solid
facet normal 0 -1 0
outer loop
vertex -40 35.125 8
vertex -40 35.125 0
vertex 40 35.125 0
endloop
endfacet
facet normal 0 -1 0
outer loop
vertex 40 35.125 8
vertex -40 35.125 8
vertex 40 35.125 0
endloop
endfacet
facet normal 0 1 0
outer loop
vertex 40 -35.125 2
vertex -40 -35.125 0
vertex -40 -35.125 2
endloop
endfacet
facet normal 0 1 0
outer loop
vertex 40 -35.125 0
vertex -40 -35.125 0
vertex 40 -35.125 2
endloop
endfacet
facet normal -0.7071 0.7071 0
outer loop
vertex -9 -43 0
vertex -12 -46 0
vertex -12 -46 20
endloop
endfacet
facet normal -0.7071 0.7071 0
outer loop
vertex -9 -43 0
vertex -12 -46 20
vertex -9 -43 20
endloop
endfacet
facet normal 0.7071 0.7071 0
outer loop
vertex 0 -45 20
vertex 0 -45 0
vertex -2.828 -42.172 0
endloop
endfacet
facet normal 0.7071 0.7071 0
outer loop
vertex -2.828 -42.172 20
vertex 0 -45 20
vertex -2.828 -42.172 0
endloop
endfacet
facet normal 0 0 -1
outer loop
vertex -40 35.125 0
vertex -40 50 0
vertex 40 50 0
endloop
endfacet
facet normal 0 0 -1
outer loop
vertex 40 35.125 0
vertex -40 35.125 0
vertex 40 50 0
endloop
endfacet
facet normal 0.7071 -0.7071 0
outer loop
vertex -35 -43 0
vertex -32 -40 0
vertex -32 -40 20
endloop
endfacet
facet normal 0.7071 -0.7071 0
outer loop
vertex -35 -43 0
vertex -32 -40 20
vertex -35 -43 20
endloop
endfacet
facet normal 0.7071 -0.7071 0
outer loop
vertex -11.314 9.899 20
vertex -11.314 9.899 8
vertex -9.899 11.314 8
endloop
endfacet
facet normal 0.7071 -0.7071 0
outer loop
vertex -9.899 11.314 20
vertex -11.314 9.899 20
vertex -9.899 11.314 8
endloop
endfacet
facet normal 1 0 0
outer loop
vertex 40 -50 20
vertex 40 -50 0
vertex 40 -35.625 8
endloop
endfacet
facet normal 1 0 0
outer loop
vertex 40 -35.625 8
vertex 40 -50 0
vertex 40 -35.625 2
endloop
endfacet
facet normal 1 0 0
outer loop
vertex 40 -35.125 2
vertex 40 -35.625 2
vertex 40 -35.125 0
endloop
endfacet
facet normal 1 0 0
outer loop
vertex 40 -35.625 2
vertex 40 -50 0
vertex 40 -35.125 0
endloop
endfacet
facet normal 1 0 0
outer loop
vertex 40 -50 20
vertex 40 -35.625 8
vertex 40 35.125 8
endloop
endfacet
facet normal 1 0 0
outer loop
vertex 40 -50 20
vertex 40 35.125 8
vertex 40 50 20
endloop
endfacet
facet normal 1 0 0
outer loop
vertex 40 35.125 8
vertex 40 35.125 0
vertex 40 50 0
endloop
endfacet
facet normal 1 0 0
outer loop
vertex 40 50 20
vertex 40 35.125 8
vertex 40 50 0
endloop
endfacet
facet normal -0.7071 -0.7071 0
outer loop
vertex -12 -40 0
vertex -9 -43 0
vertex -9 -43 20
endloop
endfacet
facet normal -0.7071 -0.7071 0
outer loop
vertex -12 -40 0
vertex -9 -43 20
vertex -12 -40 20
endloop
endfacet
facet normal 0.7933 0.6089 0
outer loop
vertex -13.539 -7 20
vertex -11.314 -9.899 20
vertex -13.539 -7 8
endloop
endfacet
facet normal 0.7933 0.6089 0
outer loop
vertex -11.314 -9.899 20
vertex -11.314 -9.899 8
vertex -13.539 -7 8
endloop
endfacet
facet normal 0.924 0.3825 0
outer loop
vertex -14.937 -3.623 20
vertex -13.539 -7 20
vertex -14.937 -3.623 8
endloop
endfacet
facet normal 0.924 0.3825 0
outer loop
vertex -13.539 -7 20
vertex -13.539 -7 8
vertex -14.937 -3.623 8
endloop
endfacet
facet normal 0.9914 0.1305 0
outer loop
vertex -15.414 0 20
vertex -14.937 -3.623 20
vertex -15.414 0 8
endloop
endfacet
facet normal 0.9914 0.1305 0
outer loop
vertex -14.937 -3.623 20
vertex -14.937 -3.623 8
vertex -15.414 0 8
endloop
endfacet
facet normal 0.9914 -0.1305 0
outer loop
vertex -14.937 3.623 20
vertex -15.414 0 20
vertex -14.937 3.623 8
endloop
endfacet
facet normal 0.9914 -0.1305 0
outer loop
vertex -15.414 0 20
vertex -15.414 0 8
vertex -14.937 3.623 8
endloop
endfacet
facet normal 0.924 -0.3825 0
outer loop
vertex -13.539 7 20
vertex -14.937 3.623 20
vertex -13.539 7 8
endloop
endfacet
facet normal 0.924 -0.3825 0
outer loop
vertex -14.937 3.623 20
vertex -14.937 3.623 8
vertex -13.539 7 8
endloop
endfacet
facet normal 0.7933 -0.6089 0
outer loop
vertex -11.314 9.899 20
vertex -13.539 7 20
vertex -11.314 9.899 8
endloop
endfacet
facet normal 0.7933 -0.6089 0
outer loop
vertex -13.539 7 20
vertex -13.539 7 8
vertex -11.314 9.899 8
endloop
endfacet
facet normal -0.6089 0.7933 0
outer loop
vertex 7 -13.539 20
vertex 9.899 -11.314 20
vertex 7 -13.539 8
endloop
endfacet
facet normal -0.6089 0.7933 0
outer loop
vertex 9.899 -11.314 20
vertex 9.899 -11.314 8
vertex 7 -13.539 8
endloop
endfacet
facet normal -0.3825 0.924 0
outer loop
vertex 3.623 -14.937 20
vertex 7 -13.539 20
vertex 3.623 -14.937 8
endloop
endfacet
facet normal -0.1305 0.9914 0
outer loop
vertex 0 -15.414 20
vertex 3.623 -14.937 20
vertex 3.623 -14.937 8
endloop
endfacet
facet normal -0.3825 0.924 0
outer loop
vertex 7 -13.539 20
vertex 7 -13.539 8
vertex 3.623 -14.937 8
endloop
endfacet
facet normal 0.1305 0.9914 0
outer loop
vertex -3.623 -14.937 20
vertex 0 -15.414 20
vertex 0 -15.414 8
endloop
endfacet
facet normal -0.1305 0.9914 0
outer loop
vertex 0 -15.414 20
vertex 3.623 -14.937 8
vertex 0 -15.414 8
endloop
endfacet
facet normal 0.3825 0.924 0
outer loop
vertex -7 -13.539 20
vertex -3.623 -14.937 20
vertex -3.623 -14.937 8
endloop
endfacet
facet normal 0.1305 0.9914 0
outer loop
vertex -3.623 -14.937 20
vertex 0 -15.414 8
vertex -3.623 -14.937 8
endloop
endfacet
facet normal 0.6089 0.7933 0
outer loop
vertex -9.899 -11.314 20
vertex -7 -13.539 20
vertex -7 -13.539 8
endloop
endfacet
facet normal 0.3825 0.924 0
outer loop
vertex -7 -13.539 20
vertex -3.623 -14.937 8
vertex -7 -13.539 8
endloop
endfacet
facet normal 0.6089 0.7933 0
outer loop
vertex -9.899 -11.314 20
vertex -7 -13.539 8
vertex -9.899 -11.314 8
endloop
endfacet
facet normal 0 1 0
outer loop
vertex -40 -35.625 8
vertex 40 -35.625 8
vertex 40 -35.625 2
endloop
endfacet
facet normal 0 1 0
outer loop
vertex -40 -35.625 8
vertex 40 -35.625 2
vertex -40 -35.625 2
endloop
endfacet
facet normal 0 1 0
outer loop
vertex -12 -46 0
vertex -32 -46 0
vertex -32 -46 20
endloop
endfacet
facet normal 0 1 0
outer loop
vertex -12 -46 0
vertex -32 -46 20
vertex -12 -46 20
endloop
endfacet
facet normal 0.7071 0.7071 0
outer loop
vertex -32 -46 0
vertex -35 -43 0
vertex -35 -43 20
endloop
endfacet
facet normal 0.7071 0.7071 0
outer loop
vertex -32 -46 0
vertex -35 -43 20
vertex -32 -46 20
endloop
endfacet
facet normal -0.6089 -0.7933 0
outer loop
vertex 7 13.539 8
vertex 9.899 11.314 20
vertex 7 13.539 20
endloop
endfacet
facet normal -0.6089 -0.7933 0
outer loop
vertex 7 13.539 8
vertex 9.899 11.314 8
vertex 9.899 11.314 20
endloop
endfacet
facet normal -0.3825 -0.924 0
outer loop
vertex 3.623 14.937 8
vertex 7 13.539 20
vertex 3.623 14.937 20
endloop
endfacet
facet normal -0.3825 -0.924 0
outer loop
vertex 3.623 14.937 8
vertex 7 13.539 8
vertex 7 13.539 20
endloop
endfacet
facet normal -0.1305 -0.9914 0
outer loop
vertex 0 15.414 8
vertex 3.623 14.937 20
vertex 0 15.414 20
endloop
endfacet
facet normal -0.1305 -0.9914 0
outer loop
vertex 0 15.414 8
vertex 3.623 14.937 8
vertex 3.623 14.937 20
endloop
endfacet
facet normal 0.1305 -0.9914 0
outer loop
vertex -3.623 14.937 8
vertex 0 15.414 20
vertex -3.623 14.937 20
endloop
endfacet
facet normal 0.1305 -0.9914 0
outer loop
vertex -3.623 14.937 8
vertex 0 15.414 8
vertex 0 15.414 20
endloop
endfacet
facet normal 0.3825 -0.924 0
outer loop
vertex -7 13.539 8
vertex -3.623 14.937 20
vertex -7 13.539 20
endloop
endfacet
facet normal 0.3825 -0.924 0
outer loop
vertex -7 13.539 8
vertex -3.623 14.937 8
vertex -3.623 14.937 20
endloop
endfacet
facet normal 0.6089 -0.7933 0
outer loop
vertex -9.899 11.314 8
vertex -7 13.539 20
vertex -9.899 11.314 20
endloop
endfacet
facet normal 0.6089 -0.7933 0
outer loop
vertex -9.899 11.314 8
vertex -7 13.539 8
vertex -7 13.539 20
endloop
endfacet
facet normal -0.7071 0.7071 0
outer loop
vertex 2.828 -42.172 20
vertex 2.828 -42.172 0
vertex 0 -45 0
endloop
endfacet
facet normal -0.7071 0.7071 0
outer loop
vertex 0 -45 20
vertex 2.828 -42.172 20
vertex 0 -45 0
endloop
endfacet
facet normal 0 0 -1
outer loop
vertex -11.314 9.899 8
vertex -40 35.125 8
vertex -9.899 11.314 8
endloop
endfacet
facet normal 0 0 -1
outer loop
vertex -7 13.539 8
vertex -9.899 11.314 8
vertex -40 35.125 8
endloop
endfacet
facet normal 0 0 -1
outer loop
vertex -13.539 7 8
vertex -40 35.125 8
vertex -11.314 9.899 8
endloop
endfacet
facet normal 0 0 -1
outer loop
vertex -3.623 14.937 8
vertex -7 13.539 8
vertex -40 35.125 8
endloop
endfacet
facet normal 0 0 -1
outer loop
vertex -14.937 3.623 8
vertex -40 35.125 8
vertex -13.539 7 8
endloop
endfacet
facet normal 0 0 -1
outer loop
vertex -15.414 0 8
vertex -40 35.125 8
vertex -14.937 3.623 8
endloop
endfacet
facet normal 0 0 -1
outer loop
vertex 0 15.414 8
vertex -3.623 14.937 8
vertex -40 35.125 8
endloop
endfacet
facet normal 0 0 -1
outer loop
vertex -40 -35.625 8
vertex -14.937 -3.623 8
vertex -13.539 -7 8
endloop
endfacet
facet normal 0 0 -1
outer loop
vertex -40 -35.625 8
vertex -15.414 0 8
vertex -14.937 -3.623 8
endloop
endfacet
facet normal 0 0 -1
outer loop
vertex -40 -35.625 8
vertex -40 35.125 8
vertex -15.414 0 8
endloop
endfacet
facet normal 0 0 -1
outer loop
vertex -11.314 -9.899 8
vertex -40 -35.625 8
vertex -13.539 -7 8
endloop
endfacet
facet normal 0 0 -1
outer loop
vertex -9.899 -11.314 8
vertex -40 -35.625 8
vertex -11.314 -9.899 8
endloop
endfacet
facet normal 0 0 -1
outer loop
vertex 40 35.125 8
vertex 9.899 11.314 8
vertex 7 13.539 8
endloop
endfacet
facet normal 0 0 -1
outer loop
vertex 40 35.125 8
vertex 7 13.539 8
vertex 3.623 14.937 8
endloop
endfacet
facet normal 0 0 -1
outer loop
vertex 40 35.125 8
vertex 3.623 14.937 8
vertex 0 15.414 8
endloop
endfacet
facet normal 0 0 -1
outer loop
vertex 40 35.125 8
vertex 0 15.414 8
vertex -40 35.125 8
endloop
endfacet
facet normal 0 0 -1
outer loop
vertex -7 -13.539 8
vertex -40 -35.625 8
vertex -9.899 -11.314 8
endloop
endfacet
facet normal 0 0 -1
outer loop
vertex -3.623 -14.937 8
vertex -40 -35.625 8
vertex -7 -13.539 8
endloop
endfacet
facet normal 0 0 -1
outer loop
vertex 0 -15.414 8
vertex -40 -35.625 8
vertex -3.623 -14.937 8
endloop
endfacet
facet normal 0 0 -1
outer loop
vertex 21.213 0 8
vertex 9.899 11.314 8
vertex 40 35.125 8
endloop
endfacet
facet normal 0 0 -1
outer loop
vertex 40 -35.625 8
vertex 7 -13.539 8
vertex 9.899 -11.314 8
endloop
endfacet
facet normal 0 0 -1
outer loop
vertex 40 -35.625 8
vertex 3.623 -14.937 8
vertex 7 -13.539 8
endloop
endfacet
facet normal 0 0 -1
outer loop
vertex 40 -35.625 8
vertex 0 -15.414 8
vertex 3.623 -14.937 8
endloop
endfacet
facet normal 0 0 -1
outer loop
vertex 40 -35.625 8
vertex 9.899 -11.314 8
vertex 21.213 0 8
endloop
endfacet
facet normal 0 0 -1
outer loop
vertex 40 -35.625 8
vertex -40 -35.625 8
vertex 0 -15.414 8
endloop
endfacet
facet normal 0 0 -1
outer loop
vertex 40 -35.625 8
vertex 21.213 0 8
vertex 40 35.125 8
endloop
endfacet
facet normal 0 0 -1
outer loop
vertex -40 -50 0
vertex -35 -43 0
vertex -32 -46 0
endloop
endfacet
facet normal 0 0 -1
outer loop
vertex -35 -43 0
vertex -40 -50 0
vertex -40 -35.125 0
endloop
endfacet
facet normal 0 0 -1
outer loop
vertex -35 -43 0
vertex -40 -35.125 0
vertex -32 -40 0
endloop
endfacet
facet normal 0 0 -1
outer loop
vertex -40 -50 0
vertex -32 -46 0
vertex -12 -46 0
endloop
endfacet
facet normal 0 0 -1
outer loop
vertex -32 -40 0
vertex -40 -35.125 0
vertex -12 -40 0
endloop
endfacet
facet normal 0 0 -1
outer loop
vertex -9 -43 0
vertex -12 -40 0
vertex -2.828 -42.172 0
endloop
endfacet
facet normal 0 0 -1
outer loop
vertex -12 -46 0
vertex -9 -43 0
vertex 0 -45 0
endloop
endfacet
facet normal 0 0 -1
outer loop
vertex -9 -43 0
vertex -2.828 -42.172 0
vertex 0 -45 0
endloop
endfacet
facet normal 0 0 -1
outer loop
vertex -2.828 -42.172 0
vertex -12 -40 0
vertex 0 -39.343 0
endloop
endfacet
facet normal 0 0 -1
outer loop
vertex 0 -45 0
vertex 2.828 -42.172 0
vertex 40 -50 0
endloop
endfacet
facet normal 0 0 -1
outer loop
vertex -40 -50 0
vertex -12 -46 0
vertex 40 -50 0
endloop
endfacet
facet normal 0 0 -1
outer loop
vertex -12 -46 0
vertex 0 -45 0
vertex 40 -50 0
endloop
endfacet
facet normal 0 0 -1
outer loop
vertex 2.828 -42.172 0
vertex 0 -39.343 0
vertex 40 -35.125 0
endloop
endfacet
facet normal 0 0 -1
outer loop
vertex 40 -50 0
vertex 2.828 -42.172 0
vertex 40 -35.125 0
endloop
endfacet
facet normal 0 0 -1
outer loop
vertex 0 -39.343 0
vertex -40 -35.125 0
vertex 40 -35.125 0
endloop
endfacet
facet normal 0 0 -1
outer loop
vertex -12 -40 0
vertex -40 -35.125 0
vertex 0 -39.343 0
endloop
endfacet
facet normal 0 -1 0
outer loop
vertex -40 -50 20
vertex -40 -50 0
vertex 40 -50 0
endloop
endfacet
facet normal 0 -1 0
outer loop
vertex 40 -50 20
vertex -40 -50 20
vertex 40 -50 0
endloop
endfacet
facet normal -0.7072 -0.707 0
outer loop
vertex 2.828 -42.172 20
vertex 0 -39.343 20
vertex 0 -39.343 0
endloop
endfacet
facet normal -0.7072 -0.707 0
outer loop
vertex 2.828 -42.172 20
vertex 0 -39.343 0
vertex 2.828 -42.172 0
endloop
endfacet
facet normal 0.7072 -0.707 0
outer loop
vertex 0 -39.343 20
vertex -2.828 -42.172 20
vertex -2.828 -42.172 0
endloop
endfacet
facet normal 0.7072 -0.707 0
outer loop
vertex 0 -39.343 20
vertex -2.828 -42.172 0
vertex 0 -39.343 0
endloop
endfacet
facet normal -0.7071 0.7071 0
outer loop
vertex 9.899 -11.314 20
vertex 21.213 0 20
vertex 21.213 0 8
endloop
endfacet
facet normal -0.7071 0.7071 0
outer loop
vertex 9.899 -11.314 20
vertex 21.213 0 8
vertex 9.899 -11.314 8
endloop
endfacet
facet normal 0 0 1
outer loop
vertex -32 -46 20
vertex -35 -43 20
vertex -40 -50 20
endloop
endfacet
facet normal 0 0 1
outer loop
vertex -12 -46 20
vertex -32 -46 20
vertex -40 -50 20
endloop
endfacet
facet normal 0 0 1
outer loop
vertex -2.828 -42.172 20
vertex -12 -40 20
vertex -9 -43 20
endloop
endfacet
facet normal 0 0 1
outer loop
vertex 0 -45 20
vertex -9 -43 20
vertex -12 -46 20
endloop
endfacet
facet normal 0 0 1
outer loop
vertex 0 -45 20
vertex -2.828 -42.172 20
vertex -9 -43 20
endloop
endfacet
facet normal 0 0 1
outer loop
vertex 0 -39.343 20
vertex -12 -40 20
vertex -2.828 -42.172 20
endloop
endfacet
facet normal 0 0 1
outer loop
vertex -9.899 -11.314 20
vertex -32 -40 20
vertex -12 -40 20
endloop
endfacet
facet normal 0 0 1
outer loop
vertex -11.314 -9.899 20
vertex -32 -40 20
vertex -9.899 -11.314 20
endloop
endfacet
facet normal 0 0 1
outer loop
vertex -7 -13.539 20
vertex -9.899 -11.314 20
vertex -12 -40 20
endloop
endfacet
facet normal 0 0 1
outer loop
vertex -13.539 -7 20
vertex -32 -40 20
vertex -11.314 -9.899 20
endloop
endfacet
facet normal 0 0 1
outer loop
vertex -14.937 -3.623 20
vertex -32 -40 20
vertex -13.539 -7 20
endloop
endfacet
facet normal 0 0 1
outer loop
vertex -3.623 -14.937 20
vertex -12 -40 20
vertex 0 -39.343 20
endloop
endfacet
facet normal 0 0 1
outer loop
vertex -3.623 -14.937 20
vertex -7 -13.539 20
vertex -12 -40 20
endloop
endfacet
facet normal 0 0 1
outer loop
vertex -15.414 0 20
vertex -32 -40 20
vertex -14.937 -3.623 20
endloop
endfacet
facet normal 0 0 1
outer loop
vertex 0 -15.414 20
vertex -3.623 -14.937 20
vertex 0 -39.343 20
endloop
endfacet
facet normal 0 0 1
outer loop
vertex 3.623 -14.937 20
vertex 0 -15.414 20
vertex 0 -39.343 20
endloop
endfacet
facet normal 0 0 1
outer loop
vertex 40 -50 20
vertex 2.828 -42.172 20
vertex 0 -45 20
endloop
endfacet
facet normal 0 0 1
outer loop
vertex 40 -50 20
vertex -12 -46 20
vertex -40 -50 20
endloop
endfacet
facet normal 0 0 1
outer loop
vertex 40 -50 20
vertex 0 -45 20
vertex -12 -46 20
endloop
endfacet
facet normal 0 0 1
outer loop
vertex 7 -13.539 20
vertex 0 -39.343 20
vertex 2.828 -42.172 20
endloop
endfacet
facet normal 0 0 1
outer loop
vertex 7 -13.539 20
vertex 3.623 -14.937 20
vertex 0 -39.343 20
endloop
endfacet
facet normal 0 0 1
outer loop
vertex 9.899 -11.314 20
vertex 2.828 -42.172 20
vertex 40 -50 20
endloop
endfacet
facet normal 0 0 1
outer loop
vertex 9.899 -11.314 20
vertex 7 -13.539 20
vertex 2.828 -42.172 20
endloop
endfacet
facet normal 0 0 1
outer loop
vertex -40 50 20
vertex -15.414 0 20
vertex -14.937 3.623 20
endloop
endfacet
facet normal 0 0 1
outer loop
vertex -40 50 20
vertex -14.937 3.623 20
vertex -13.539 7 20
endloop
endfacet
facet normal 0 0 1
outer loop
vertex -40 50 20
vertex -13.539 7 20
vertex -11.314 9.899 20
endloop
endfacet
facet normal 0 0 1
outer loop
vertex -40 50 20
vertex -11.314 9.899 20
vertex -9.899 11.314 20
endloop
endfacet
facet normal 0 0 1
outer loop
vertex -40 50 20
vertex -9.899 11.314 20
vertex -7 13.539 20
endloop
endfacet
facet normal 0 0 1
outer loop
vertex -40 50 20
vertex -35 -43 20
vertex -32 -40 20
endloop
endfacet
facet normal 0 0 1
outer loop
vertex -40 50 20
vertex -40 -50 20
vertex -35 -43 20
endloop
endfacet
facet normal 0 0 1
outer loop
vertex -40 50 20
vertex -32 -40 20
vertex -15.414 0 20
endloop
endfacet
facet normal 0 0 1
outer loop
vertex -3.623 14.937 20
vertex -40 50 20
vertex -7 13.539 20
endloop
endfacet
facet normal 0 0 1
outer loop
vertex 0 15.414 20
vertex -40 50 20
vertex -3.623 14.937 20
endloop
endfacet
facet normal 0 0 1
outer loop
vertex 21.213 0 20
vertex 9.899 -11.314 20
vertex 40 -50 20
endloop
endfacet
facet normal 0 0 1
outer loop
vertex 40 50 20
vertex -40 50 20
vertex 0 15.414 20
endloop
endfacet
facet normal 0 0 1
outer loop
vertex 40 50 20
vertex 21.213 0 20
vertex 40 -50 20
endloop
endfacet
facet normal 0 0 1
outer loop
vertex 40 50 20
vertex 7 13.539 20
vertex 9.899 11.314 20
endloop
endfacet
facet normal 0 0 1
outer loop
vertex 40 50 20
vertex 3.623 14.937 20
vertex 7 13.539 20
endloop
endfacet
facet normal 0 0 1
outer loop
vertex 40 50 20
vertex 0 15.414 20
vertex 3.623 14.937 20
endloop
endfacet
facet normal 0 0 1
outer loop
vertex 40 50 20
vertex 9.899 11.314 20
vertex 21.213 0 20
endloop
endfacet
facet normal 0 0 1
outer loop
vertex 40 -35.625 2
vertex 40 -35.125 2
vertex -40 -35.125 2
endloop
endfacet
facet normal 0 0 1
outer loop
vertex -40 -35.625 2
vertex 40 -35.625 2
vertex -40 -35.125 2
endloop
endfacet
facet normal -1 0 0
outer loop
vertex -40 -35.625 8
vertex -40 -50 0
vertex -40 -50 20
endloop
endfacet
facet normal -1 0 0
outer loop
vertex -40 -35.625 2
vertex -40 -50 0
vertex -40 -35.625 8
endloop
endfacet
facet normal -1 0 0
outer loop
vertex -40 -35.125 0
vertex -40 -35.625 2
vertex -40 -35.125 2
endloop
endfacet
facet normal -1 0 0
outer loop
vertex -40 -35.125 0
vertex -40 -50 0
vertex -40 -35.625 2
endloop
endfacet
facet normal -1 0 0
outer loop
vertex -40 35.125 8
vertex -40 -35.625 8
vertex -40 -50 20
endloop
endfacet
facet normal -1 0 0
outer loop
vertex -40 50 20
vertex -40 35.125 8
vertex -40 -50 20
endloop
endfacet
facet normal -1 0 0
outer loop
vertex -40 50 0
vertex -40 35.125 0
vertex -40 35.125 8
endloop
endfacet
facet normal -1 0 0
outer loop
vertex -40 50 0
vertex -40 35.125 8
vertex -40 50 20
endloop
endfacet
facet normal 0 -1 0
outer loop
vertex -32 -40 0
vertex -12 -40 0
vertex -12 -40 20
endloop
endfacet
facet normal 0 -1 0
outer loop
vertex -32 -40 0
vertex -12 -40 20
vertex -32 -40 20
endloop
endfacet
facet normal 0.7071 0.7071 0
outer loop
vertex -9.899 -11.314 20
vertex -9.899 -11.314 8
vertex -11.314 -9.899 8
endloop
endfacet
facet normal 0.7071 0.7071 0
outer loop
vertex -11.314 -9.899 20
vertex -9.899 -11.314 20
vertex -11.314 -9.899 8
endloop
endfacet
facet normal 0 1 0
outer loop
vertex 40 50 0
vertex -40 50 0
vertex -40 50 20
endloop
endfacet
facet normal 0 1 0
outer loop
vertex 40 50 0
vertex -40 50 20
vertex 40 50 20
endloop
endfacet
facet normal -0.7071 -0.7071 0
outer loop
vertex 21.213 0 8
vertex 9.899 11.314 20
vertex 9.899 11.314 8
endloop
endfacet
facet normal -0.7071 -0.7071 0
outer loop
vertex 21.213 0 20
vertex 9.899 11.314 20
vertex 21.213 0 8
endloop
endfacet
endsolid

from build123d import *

# Parameters (mm, degrees)
SKETCH_W        = 80
SKETCH_H        = 100
PAD_DEPTH       = 20
SKETCH001_W     = 100
SKETCH001_H     = 70.25
POCKET_DEPTH    = 8
POCKET001_DEPTH = 20.001
POCKET002_DEPTH = 20.001
FILLET_R        = 14
SKETCH004_W     = 200
SKETCH004_H     = 6
POCKET003_DEPTH = 0.5


with BuildPart() as part:
    # Sketch → Pad (new body)
    with BuildSketch(Plane.XY):
        Rectangle(SKETCH_W, SKETCH_H)
    extrude(amount=PAD_DEPTH)

    # Sketch001 → Pocket (cut)
    with BuildSketch(Plane(origin=(0, 0, 0), x_dir=(1, 0, 0), z_dir=(0, 0, -1))):
        Rectangle(SKETCH001_W, SKETCH001_H)
    extrude(amount=-POCKET_DEPTH, mode=Mode.SUBTRACT)

    # Sketch002 → Pocket001 (cut, through all)
    with BuildSketch(Plane(origin=(0, 0, 0), x_dir=(1, 0, 0), z_dir=(0, 0, -1))):
        Polygon((-32, 46), (-12, 46), (-9, 43), (-12, 40), (-32, 40), (-35, 43), align=None)
        Polygon((0, 45), (-2.828427, 42.171573), (0, 39.343146), (2.828427, 42.171573), align=None)
    extrude(amount=-POCKET001_DEPTH, mode=Mode.SUBTRACT)

    # Sketch003 → Pocket002 (cut, through all)
    with BuildSketch(Plane.XY.offset(20)):
        Polygon((-21.213203, 0), (0, 21.213203), (21.213203, 0), (0, -21.213203), align=None)
    extrude(amount=-POCKET002_DEPTH, mode=Mode.SUBTRACT)

    # Fillet
    fillet_edges = [part.edges().sort_by_distance(p)[0] for p in [
        (0, 21.213203, 14),
        (-21.213203, 0, 14),
        (0, -21.213203, 14),
    ]]
    fillet(fillet_edges, radius=FILLET_R)

    # Sketch004 → Pocket003 (cut)
    with BuildSketch(Plane(origin=(0, -35.125, 0), x_dir=(-1, 0, 0), z_dir=(0, 1, 0))):
        with Locations((0, 5)):
            Rectangle(SKETCH004_W, SKETCH004_H)
    extrude(amount=-POCKET003_DEPTH, mode=Mode.SUBTRACT)


solid = part.part
